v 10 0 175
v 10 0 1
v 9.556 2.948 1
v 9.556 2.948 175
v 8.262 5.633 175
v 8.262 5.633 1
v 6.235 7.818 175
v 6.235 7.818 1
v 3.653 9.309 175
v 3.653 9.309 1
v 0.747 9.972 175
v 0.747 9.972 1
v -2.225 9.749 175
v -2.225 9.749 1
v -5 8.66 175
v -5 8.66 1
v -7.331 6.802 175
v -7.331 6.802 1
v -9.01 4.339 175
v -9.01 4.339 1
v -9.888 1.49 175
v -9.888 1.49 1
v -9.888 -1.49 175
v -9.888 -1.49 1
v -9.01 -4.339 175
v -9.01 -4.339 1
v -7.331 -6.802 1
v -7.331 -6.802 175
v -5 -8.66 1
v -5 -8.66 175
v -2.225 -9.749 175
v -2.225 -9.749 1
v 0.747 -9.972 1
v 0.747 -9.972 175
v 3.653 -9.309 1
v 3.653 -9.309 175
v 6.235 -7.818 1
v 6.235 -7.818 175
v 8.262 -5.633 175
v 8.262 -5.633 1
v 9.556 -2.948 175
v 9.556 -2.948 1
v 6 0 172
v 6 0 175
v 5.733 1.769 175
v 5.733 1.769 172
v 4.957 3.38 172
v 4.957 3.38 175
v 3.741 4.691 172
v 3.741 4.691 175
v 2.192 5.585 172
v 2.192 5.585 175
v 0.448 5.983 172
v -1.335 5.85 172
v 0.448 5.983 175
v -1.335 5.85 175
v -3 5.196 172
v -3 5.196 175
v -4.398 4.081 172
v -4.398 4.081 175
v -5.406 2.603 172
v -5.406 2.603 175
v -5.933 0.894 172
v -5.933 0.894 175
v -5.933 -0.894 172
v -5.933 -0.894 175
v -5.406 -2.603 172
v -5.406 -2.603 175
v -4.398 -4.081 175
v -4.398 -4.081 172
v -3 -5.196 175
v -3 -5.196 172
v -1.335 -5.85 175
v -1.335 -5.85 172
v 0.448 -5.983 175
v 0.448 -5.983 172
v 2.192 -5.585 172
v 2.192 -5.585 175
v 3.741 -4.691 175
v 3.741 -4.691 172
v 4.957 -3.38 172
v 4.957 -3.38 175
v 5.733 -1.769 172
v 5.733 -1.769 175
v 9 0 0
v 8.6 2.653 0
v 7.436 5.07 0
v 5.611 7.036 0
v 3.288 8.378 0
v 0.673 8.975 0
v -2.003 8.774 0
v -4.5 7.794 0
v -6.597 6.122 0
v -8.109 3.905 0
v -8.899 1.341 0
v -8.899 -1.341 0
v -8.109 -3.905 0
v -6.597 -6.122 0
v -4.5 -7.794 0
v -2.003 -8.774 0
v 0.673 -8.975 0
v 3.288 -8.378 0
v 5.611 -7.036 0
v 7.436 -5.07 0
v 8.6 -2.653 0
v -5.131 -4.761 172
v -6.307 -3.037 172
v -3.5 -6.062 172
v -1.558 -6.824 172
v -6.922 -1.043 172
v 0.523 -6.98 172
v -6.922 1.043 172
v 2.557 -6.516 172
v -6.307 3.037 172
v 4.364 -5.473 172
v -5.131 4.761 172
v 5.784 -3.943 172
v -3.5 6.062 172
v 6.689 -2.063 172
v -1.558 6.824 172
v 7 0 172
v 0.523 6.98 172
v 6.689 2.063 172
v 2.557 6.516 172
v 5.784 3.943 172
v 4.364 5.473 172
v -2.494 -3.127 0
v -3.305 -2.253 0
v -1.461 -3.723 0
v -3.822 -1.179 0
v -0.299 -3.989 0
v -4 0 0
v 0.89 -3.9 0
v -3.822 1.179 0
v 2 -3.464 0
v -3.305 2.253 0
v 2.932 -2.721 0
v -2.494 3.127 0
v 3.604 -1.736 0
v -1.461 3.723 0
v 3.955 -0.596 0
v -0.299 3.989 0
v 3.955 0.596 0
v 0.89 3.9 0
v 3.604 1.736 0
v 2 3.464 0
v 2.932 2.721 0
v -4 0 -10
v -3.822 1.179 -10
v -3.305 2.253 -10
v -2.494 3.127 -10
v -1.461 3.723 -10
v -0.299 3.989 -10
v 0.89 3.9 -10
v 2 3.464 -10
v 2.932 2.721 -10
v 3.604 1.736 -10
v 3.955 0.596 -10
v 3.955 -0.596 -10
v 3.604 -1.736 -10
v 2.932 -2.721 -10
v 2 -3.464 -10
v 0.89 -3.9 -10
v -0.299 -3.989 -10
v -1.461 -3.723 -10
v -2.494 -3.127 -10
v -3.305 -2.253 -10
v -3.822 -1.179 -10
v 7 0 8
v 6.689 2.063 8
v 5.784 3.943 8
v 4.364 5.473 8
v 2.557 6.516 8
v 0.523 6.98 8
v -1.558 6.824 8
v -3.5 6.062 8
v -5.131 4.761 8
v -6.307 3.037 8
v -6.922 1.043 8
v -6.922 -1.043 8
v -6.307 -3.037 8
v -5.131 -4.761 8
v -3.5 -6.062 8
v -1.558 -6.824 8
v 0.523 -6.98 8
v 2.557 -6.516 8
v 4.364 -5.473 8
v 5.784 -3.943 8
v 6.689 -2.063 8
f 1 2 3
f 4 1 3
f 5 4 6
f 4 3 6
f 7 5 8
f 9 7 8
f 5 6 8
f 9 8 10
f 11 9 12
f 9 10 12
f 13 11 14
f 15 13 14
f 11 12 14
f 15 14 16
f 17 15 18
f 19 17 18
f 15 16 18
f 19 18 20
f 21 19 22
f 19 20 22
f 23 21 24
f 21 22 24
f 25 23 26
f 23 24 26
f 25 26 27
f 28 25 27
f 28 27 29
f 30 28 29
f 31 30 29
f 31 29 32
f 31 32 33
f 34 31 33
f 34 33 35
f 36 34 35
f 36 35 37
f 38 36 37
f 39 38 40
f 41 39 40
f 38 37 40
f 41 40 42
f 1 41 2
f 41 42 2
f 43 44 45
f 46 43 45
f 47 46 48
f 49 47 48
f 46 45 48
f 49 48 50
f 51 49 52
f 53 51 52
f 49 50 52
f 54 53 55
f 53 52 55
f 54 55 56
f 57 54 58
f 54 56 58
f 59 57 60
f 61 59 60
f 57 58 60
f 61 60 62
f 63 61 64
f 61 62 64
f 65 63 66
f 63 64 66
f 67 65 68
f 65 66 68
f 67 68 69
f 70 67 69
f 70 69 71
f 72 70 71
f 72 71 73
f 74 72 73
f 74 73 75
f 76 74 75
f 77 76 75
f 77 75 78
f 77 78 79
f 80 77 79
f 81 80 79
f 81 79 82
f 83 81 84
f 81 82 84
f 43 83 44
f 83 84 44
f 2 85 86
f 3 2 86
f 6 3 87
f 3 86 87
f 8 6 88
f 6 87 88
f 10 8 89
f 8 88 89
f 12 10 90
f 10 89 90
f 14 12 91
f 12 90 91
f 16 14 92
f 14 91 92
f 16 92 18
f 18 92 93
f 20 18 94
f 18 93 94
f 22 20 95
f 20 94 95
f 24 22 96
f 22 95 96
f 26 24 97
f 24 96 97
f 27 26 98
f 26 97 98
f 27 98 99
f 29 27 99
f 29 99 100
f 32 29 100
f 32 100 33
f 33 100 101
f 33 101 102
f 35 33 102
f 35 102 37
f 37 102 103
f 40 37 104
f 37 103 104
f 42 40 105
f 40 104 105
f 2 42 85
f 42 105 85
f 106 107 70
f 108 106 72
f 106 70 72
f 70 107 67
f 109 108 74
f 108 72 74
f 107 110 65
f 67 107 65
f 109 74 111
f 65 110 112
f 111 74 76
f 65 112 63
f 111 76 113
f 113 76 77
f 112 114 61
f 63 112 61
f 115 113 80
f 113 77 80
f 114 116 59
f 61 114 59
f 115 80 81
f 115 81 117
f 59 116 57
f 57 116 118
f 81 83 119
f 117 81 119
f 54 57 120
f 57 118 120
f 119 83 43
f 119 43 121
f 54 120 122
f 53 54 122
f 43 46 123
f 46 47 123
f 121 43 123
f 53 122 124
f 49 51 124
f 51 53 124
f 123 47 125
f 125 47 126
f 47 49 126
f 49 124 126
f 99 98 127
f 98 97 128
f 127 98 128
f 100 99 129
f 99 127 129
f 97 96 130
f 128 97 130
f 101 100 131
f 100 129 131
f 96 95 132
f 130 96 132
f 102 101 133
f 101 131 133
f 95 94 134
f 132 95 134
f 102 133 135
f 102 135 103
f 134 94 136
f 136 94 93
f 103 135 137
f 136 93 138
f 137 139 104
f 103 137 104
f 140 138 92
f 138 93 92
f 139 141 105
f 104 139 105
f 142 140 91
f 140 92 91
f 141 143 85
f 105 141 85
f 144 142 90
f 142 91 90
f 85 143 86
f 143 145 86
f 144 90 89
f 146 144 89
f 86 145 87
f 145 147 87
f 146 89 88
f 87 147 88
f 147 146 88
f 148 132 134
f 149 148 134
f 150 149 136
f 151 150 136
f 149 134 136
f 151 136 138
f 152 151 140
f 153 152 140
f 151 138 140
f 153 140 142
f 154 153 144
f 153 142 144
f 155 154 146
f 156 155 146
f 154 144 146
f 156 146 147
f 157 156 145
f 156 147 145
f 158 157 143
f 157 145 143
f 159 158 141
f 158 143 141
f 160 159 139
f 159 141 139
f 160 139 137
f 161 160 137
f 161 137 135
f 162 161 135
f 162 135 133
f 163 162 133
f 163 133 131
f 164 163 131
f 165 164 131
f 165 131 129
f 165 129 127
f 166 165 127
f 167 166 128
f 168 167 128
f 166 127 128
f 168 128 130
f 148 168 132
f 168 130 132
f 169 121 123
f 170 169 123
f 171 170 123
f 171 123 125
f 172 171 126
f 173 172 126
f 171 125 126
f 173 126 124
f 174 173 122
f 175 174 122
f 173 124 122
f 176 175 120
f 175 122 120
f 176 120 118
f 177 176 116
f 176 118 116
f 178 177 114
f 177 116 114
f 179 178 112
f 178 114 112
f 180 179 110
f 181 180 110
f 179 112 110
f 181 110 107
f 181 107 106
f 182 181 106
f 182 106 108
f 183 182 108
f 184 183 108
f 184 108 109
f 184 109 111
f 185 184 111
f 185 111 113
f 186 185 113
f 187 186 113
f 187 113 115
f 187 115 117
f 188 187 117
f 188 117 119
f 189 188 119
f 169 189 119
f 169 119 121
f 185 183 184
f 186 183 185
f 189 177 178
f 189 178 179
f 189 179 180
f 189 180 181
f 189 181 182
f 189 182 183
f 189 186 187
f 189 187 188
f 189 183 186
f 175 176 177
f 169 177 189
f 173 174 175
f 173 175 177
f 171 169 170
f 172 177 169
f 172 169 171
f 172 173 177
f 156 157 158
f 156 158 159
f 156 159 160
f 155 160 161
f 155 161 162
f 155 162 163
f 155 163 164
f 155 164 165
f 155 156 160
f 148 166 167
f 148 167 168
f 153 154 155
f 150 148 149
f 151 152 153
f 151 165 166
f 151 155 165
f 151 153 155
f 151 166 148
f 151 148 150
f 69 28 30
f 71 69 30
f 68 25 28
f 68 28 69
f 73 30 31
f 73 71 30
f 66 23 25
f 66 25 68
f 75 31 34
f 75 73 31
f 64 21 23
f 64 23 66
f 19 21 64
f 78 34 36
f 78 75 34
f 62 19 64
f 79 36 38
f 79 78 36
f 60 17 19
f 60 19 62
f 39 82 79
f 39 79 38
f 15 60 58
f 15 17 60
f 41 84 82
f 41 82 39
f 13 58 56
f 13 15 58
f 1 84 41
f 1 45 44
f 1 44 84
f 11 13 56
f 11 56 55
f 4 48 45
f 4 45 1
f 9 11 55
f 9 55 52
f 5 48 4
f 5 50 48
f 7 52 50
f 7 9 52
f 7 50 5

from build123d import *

# Parameters (mm, degrees)
SKETCH_1_R          = 10
EXTRUDE_1_DEPTH     = 175
SKETCH_2_R          = 7
CUT_EXTRUDE_1_DEPTH = 167
SKETCH_3_R          = 4
EXTRUDE_2_DEPTH     = 10
CHAMFER_1_SIZE      = 1
SKETCH_4_R          = 7
SKETCH_4_R_2        = 6
EXTRUDE_3_DEPTH     = 3


with BuildPart() as part:
    # 草图1 → 凸台-拉伸1 (new body)
    with BuildSketch(Plane.XY):
        Circle(SKETCH_1_R)
    extrude(amount=EXTRUDE_1_DEPTH)

    # 草图2 → 切除-拉伸1 (cut)
    with BuildSketch(Plane.XY.offset(175)):
        Circle(SKETCH_2_R)
    extrude(amount=-CUT_EXTRUDE_1_DEPTH, mode=Mode.SUBTRACT)

    # 草图3 → 凸台-拉伸2 (add)
    with BuildSketch(Plane(origin=(0, 0, 0), x_dir=(-1, 0, 0), z_dir=(0, 0, -1))):
        Circle(SKETCH_3_R)
    extrude(amount=EXTRUDE_2_DEPTH)

    # 倒角1
    chamfer_1_edges = [part.edges().sort_by_distance(p)[0] for p in [
        (-10, 0, 0),
    ]]
    chamfer(chamfer_1_edges, length=CHAMFER_1_SIZE)

    # 草图4 → 凸台-拉伸3 (add)
    with BuildSketch(Plane.XY.offset(175)):
        Circle(SKETCH_4_R)
        Circle(SKETCH_4_R_2, mode=Mode.SUBTRACT)
    extrude(amount=-EXTRUDE_3_DEPTH)


solid = part.part
